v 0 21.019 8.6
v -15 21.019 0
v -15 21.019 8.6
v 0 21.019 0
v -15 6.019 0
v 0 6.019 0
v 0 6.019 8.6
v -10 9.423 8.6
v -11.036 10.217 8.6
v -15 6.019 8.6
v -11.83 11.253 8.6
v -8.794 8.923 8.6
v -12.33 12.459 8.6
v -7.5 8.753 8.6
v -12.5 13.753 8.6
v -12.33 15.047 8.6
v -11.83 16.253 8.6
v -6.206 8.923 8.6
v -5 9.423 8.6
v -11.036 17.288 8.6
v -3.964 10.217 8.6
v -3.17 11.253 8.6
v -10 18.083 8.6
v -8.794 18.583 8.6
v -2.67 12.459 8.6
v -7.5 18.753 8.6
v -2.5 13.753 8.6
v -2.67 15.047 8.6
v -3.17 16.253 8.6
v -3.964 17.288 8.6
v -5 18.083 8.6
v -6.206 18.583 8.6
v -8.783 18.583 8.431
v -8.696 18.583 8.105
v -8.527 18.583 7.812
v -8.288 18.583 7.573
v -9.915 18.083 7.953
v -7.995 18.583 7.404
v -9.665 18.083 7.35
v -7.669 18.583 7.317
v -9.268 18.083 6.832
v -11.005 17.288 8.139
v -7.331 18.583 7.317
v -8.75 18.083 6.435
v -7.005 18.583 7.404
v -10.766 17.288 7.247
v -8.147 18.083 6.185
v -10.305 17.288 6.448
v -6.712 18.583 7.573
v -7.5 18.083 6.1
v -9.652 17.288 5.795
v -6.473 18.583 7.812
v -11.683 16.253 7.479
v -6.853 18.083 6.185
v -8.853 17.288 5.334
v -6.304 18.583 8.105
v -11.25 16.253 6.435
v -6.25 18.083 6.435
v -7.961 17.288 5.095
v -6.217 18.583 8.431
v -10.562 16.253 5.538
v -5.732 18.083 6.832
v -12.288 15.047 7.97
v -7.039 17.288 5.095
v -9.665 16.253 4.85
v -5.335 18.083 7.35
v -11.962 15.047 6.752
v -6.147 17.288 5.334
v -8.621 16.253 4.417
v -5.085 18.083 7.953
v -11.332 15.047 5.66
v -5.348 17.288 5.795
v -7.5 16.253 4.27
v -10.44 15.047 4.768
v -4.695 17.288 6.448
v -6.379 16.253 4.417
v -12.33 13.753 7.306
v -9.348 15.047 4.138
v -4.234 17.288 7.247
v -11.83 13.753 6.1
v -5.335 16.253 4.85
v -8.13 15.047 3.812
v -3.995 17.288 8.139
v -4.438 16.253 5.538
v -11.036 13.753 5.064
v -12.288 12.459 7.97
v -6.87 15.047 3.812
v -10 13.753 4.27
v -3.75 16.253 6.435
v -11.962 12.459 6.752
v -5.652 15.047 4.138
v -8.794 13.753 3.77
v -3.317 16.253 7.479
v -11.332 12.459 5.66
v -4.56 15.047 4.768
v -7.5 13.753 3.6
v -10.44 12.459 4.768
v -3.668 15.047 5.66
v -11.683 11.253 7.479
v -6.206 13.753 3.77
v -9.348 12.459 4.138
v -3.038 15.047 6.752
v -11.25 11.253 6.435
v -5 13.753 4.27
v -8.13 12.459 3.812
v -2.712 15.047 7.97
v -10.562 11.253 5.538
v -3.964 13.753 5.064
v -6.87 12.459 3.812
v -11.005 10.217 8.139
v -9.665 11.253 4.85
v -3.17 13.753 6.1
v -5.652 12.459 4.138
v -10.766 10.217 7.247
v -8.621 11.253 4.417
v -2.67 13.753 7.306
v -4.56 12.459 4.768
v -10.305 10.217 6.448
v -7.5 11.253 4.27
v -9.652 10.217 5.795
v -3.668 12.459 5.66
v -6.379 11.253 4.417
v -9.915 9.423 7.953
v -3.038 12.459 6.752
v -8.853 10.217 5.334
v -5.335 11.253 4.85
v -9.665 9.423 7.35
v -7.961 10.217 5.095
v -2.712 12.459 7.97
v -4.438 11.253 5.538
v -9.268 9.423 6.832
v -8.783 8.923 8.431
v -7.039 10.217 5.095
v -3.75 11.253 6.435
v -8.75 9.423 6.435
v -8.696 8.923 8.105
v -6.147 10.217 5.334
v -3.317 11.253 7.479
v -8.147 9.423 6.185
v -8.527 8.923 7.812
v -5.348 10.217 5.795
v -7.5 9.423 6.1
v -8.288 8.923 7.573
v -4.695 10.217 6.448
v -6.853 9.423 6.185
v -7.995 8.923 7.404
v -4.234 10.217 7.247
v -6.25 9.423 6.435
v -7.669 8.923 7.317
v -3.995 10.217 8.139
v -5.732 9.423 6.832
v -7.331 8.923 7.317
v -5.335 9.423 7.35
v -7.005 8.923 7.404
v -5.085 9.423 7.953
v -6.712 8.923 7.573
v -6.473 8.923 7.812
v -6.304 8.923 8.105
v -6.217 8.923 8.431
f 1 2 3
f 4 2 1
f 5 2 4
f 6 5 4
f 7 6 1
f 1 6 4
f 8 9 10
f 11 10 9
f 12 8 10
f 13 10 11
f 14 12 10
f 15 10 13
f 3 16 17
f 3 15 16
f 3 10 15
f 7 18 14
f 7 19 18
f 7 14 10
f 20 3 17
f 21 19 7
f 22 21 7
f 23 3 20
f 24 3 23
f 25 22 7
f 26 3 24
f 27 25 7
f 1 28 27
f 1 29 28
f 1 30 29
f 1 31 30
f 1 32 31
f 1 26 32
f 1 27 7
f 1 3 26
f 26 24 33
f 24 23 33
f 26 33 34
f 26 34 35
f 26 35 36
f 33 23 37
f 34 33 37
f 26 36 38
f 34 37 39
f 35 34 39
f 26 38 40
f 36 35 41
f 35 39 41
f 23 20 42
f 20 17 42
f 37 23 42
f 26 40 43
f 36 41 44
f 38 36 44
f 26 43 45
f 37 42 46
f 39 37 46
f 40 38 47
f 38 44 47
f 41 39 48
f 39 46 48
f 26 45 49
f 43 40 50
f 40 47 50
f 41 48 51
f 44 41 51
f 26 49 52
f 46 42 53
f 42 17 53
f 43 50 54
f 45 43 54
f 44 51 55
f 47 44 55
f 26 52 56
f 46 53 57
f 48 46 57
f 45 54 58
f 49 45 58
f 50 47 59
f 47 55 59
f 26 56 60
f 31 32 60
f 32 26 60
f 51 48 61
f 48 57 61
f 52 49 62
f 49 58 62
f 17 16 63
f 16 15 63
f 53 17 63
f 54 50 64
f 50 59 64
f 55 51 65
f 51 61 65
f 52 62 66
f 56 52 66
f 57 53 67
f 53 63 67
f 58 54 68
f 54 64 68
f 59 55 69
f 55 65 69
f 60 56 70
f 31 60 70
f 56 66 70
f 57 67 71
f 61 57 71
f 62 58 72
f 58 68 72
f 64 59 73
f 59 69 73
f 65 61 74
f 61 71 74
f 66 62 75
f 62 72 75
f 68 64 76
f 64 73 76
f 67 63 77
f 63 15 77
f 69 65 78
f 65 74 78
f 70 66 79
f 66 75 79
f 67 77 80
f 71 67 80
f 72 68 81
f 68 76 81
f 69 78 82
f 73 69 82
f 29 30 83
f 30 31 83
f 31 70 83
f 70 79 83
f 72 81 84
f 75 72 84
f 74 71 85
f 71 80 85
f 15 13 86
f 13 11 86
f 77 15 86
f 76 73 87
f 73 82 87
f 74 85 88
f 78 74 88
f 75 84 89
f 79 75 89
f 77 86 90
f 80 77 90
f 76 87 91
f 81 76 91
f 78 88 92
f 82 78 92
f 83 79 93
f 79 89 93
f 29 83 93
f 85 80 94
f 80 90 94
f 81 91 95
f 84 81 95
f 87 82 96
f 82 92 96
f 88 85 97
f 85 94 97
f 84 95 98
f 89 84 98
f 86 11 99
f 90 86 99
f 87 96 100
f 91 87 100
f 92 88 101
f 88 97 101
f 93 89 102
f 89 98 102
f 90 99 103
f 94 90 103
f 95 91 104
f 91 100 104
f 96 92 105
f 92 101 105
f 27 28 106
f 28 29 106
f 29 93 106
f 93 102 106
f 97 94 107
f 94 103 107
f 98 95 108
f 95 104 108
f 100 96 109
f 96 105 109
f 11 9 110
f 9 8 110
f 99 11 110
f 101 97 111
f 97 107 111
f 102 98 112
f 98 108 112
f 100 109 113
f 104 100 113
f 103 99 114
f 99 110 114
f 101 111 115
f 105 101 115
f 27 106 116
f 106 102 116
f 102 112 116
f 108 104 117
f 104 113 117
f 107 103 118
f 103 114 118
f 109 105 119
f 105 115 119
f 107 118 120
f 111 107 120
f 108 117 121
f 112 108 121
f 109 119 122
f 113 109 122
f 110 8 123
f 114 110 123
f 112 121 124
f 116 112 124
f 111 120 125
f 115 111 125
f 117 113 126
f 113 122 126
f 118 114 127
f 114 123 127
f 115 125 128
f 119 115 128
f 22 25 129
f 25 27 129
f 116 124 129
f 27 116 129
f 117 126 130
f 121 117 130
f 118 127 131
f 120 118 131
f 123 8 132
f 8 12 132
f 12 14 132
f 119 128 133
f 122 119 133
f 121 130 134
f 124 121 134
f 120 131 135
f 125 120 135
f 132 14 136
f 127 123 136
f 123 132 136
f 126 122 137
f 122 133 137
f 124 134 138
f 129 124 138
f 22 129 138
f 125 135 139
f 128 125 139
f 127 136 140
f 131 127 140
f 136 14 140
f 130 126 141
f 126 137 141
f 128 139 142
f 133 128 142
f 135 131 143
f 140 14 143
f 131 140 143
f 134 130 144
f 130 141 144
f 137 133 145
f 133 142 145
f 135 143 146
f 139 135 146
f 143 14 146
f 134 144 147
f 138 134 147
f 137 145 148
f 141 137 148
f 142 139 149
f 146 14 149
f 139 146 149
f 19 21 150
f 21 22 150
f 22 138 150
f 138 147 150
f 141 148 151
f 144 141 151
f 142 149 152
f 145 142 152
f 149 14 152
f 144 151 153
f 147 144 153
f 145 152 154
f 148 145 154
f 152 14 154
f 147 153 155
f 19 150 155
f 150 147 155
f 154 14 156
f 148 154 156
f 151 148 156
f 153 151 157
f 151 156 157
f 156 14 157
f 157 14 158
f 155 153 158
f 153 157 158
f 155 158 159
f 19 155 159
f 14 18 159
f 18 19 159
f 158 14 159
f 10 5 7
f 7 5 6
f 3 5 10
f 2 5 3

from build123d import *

# Parameters (mm, degrees)
F0_W     = 15
F0_H     = 15
F1_DEPTH = 8.6


with BuildPart() as f1:
    # F0 (on Top) → F1 (new body)
    with BuildSketch(Plane.XY):
        with Locations((-7.5, 13.519098)):
            Rectangle(F0_W, F0_H)
    extrude(amount=F1_DEPTH)

    # F2 (on face) → F3 (revolve, cut)
    with BuildSketch(Plane.XY.offset(8.6)):
        with BuildLine():
            Line((-7.5, 8.752942), (-7.5, 18.752942))
            ThreePointArc((-7.5, 18.752942), (-12.5, 13.752942), (-7.5, 8.752942))
        make_face()
    revolve(axis=Axis((-7.5, 13.752942, 8.6), (0, -1, 0)), mode=Mode.SUBTRACT)


solid = f1.part
